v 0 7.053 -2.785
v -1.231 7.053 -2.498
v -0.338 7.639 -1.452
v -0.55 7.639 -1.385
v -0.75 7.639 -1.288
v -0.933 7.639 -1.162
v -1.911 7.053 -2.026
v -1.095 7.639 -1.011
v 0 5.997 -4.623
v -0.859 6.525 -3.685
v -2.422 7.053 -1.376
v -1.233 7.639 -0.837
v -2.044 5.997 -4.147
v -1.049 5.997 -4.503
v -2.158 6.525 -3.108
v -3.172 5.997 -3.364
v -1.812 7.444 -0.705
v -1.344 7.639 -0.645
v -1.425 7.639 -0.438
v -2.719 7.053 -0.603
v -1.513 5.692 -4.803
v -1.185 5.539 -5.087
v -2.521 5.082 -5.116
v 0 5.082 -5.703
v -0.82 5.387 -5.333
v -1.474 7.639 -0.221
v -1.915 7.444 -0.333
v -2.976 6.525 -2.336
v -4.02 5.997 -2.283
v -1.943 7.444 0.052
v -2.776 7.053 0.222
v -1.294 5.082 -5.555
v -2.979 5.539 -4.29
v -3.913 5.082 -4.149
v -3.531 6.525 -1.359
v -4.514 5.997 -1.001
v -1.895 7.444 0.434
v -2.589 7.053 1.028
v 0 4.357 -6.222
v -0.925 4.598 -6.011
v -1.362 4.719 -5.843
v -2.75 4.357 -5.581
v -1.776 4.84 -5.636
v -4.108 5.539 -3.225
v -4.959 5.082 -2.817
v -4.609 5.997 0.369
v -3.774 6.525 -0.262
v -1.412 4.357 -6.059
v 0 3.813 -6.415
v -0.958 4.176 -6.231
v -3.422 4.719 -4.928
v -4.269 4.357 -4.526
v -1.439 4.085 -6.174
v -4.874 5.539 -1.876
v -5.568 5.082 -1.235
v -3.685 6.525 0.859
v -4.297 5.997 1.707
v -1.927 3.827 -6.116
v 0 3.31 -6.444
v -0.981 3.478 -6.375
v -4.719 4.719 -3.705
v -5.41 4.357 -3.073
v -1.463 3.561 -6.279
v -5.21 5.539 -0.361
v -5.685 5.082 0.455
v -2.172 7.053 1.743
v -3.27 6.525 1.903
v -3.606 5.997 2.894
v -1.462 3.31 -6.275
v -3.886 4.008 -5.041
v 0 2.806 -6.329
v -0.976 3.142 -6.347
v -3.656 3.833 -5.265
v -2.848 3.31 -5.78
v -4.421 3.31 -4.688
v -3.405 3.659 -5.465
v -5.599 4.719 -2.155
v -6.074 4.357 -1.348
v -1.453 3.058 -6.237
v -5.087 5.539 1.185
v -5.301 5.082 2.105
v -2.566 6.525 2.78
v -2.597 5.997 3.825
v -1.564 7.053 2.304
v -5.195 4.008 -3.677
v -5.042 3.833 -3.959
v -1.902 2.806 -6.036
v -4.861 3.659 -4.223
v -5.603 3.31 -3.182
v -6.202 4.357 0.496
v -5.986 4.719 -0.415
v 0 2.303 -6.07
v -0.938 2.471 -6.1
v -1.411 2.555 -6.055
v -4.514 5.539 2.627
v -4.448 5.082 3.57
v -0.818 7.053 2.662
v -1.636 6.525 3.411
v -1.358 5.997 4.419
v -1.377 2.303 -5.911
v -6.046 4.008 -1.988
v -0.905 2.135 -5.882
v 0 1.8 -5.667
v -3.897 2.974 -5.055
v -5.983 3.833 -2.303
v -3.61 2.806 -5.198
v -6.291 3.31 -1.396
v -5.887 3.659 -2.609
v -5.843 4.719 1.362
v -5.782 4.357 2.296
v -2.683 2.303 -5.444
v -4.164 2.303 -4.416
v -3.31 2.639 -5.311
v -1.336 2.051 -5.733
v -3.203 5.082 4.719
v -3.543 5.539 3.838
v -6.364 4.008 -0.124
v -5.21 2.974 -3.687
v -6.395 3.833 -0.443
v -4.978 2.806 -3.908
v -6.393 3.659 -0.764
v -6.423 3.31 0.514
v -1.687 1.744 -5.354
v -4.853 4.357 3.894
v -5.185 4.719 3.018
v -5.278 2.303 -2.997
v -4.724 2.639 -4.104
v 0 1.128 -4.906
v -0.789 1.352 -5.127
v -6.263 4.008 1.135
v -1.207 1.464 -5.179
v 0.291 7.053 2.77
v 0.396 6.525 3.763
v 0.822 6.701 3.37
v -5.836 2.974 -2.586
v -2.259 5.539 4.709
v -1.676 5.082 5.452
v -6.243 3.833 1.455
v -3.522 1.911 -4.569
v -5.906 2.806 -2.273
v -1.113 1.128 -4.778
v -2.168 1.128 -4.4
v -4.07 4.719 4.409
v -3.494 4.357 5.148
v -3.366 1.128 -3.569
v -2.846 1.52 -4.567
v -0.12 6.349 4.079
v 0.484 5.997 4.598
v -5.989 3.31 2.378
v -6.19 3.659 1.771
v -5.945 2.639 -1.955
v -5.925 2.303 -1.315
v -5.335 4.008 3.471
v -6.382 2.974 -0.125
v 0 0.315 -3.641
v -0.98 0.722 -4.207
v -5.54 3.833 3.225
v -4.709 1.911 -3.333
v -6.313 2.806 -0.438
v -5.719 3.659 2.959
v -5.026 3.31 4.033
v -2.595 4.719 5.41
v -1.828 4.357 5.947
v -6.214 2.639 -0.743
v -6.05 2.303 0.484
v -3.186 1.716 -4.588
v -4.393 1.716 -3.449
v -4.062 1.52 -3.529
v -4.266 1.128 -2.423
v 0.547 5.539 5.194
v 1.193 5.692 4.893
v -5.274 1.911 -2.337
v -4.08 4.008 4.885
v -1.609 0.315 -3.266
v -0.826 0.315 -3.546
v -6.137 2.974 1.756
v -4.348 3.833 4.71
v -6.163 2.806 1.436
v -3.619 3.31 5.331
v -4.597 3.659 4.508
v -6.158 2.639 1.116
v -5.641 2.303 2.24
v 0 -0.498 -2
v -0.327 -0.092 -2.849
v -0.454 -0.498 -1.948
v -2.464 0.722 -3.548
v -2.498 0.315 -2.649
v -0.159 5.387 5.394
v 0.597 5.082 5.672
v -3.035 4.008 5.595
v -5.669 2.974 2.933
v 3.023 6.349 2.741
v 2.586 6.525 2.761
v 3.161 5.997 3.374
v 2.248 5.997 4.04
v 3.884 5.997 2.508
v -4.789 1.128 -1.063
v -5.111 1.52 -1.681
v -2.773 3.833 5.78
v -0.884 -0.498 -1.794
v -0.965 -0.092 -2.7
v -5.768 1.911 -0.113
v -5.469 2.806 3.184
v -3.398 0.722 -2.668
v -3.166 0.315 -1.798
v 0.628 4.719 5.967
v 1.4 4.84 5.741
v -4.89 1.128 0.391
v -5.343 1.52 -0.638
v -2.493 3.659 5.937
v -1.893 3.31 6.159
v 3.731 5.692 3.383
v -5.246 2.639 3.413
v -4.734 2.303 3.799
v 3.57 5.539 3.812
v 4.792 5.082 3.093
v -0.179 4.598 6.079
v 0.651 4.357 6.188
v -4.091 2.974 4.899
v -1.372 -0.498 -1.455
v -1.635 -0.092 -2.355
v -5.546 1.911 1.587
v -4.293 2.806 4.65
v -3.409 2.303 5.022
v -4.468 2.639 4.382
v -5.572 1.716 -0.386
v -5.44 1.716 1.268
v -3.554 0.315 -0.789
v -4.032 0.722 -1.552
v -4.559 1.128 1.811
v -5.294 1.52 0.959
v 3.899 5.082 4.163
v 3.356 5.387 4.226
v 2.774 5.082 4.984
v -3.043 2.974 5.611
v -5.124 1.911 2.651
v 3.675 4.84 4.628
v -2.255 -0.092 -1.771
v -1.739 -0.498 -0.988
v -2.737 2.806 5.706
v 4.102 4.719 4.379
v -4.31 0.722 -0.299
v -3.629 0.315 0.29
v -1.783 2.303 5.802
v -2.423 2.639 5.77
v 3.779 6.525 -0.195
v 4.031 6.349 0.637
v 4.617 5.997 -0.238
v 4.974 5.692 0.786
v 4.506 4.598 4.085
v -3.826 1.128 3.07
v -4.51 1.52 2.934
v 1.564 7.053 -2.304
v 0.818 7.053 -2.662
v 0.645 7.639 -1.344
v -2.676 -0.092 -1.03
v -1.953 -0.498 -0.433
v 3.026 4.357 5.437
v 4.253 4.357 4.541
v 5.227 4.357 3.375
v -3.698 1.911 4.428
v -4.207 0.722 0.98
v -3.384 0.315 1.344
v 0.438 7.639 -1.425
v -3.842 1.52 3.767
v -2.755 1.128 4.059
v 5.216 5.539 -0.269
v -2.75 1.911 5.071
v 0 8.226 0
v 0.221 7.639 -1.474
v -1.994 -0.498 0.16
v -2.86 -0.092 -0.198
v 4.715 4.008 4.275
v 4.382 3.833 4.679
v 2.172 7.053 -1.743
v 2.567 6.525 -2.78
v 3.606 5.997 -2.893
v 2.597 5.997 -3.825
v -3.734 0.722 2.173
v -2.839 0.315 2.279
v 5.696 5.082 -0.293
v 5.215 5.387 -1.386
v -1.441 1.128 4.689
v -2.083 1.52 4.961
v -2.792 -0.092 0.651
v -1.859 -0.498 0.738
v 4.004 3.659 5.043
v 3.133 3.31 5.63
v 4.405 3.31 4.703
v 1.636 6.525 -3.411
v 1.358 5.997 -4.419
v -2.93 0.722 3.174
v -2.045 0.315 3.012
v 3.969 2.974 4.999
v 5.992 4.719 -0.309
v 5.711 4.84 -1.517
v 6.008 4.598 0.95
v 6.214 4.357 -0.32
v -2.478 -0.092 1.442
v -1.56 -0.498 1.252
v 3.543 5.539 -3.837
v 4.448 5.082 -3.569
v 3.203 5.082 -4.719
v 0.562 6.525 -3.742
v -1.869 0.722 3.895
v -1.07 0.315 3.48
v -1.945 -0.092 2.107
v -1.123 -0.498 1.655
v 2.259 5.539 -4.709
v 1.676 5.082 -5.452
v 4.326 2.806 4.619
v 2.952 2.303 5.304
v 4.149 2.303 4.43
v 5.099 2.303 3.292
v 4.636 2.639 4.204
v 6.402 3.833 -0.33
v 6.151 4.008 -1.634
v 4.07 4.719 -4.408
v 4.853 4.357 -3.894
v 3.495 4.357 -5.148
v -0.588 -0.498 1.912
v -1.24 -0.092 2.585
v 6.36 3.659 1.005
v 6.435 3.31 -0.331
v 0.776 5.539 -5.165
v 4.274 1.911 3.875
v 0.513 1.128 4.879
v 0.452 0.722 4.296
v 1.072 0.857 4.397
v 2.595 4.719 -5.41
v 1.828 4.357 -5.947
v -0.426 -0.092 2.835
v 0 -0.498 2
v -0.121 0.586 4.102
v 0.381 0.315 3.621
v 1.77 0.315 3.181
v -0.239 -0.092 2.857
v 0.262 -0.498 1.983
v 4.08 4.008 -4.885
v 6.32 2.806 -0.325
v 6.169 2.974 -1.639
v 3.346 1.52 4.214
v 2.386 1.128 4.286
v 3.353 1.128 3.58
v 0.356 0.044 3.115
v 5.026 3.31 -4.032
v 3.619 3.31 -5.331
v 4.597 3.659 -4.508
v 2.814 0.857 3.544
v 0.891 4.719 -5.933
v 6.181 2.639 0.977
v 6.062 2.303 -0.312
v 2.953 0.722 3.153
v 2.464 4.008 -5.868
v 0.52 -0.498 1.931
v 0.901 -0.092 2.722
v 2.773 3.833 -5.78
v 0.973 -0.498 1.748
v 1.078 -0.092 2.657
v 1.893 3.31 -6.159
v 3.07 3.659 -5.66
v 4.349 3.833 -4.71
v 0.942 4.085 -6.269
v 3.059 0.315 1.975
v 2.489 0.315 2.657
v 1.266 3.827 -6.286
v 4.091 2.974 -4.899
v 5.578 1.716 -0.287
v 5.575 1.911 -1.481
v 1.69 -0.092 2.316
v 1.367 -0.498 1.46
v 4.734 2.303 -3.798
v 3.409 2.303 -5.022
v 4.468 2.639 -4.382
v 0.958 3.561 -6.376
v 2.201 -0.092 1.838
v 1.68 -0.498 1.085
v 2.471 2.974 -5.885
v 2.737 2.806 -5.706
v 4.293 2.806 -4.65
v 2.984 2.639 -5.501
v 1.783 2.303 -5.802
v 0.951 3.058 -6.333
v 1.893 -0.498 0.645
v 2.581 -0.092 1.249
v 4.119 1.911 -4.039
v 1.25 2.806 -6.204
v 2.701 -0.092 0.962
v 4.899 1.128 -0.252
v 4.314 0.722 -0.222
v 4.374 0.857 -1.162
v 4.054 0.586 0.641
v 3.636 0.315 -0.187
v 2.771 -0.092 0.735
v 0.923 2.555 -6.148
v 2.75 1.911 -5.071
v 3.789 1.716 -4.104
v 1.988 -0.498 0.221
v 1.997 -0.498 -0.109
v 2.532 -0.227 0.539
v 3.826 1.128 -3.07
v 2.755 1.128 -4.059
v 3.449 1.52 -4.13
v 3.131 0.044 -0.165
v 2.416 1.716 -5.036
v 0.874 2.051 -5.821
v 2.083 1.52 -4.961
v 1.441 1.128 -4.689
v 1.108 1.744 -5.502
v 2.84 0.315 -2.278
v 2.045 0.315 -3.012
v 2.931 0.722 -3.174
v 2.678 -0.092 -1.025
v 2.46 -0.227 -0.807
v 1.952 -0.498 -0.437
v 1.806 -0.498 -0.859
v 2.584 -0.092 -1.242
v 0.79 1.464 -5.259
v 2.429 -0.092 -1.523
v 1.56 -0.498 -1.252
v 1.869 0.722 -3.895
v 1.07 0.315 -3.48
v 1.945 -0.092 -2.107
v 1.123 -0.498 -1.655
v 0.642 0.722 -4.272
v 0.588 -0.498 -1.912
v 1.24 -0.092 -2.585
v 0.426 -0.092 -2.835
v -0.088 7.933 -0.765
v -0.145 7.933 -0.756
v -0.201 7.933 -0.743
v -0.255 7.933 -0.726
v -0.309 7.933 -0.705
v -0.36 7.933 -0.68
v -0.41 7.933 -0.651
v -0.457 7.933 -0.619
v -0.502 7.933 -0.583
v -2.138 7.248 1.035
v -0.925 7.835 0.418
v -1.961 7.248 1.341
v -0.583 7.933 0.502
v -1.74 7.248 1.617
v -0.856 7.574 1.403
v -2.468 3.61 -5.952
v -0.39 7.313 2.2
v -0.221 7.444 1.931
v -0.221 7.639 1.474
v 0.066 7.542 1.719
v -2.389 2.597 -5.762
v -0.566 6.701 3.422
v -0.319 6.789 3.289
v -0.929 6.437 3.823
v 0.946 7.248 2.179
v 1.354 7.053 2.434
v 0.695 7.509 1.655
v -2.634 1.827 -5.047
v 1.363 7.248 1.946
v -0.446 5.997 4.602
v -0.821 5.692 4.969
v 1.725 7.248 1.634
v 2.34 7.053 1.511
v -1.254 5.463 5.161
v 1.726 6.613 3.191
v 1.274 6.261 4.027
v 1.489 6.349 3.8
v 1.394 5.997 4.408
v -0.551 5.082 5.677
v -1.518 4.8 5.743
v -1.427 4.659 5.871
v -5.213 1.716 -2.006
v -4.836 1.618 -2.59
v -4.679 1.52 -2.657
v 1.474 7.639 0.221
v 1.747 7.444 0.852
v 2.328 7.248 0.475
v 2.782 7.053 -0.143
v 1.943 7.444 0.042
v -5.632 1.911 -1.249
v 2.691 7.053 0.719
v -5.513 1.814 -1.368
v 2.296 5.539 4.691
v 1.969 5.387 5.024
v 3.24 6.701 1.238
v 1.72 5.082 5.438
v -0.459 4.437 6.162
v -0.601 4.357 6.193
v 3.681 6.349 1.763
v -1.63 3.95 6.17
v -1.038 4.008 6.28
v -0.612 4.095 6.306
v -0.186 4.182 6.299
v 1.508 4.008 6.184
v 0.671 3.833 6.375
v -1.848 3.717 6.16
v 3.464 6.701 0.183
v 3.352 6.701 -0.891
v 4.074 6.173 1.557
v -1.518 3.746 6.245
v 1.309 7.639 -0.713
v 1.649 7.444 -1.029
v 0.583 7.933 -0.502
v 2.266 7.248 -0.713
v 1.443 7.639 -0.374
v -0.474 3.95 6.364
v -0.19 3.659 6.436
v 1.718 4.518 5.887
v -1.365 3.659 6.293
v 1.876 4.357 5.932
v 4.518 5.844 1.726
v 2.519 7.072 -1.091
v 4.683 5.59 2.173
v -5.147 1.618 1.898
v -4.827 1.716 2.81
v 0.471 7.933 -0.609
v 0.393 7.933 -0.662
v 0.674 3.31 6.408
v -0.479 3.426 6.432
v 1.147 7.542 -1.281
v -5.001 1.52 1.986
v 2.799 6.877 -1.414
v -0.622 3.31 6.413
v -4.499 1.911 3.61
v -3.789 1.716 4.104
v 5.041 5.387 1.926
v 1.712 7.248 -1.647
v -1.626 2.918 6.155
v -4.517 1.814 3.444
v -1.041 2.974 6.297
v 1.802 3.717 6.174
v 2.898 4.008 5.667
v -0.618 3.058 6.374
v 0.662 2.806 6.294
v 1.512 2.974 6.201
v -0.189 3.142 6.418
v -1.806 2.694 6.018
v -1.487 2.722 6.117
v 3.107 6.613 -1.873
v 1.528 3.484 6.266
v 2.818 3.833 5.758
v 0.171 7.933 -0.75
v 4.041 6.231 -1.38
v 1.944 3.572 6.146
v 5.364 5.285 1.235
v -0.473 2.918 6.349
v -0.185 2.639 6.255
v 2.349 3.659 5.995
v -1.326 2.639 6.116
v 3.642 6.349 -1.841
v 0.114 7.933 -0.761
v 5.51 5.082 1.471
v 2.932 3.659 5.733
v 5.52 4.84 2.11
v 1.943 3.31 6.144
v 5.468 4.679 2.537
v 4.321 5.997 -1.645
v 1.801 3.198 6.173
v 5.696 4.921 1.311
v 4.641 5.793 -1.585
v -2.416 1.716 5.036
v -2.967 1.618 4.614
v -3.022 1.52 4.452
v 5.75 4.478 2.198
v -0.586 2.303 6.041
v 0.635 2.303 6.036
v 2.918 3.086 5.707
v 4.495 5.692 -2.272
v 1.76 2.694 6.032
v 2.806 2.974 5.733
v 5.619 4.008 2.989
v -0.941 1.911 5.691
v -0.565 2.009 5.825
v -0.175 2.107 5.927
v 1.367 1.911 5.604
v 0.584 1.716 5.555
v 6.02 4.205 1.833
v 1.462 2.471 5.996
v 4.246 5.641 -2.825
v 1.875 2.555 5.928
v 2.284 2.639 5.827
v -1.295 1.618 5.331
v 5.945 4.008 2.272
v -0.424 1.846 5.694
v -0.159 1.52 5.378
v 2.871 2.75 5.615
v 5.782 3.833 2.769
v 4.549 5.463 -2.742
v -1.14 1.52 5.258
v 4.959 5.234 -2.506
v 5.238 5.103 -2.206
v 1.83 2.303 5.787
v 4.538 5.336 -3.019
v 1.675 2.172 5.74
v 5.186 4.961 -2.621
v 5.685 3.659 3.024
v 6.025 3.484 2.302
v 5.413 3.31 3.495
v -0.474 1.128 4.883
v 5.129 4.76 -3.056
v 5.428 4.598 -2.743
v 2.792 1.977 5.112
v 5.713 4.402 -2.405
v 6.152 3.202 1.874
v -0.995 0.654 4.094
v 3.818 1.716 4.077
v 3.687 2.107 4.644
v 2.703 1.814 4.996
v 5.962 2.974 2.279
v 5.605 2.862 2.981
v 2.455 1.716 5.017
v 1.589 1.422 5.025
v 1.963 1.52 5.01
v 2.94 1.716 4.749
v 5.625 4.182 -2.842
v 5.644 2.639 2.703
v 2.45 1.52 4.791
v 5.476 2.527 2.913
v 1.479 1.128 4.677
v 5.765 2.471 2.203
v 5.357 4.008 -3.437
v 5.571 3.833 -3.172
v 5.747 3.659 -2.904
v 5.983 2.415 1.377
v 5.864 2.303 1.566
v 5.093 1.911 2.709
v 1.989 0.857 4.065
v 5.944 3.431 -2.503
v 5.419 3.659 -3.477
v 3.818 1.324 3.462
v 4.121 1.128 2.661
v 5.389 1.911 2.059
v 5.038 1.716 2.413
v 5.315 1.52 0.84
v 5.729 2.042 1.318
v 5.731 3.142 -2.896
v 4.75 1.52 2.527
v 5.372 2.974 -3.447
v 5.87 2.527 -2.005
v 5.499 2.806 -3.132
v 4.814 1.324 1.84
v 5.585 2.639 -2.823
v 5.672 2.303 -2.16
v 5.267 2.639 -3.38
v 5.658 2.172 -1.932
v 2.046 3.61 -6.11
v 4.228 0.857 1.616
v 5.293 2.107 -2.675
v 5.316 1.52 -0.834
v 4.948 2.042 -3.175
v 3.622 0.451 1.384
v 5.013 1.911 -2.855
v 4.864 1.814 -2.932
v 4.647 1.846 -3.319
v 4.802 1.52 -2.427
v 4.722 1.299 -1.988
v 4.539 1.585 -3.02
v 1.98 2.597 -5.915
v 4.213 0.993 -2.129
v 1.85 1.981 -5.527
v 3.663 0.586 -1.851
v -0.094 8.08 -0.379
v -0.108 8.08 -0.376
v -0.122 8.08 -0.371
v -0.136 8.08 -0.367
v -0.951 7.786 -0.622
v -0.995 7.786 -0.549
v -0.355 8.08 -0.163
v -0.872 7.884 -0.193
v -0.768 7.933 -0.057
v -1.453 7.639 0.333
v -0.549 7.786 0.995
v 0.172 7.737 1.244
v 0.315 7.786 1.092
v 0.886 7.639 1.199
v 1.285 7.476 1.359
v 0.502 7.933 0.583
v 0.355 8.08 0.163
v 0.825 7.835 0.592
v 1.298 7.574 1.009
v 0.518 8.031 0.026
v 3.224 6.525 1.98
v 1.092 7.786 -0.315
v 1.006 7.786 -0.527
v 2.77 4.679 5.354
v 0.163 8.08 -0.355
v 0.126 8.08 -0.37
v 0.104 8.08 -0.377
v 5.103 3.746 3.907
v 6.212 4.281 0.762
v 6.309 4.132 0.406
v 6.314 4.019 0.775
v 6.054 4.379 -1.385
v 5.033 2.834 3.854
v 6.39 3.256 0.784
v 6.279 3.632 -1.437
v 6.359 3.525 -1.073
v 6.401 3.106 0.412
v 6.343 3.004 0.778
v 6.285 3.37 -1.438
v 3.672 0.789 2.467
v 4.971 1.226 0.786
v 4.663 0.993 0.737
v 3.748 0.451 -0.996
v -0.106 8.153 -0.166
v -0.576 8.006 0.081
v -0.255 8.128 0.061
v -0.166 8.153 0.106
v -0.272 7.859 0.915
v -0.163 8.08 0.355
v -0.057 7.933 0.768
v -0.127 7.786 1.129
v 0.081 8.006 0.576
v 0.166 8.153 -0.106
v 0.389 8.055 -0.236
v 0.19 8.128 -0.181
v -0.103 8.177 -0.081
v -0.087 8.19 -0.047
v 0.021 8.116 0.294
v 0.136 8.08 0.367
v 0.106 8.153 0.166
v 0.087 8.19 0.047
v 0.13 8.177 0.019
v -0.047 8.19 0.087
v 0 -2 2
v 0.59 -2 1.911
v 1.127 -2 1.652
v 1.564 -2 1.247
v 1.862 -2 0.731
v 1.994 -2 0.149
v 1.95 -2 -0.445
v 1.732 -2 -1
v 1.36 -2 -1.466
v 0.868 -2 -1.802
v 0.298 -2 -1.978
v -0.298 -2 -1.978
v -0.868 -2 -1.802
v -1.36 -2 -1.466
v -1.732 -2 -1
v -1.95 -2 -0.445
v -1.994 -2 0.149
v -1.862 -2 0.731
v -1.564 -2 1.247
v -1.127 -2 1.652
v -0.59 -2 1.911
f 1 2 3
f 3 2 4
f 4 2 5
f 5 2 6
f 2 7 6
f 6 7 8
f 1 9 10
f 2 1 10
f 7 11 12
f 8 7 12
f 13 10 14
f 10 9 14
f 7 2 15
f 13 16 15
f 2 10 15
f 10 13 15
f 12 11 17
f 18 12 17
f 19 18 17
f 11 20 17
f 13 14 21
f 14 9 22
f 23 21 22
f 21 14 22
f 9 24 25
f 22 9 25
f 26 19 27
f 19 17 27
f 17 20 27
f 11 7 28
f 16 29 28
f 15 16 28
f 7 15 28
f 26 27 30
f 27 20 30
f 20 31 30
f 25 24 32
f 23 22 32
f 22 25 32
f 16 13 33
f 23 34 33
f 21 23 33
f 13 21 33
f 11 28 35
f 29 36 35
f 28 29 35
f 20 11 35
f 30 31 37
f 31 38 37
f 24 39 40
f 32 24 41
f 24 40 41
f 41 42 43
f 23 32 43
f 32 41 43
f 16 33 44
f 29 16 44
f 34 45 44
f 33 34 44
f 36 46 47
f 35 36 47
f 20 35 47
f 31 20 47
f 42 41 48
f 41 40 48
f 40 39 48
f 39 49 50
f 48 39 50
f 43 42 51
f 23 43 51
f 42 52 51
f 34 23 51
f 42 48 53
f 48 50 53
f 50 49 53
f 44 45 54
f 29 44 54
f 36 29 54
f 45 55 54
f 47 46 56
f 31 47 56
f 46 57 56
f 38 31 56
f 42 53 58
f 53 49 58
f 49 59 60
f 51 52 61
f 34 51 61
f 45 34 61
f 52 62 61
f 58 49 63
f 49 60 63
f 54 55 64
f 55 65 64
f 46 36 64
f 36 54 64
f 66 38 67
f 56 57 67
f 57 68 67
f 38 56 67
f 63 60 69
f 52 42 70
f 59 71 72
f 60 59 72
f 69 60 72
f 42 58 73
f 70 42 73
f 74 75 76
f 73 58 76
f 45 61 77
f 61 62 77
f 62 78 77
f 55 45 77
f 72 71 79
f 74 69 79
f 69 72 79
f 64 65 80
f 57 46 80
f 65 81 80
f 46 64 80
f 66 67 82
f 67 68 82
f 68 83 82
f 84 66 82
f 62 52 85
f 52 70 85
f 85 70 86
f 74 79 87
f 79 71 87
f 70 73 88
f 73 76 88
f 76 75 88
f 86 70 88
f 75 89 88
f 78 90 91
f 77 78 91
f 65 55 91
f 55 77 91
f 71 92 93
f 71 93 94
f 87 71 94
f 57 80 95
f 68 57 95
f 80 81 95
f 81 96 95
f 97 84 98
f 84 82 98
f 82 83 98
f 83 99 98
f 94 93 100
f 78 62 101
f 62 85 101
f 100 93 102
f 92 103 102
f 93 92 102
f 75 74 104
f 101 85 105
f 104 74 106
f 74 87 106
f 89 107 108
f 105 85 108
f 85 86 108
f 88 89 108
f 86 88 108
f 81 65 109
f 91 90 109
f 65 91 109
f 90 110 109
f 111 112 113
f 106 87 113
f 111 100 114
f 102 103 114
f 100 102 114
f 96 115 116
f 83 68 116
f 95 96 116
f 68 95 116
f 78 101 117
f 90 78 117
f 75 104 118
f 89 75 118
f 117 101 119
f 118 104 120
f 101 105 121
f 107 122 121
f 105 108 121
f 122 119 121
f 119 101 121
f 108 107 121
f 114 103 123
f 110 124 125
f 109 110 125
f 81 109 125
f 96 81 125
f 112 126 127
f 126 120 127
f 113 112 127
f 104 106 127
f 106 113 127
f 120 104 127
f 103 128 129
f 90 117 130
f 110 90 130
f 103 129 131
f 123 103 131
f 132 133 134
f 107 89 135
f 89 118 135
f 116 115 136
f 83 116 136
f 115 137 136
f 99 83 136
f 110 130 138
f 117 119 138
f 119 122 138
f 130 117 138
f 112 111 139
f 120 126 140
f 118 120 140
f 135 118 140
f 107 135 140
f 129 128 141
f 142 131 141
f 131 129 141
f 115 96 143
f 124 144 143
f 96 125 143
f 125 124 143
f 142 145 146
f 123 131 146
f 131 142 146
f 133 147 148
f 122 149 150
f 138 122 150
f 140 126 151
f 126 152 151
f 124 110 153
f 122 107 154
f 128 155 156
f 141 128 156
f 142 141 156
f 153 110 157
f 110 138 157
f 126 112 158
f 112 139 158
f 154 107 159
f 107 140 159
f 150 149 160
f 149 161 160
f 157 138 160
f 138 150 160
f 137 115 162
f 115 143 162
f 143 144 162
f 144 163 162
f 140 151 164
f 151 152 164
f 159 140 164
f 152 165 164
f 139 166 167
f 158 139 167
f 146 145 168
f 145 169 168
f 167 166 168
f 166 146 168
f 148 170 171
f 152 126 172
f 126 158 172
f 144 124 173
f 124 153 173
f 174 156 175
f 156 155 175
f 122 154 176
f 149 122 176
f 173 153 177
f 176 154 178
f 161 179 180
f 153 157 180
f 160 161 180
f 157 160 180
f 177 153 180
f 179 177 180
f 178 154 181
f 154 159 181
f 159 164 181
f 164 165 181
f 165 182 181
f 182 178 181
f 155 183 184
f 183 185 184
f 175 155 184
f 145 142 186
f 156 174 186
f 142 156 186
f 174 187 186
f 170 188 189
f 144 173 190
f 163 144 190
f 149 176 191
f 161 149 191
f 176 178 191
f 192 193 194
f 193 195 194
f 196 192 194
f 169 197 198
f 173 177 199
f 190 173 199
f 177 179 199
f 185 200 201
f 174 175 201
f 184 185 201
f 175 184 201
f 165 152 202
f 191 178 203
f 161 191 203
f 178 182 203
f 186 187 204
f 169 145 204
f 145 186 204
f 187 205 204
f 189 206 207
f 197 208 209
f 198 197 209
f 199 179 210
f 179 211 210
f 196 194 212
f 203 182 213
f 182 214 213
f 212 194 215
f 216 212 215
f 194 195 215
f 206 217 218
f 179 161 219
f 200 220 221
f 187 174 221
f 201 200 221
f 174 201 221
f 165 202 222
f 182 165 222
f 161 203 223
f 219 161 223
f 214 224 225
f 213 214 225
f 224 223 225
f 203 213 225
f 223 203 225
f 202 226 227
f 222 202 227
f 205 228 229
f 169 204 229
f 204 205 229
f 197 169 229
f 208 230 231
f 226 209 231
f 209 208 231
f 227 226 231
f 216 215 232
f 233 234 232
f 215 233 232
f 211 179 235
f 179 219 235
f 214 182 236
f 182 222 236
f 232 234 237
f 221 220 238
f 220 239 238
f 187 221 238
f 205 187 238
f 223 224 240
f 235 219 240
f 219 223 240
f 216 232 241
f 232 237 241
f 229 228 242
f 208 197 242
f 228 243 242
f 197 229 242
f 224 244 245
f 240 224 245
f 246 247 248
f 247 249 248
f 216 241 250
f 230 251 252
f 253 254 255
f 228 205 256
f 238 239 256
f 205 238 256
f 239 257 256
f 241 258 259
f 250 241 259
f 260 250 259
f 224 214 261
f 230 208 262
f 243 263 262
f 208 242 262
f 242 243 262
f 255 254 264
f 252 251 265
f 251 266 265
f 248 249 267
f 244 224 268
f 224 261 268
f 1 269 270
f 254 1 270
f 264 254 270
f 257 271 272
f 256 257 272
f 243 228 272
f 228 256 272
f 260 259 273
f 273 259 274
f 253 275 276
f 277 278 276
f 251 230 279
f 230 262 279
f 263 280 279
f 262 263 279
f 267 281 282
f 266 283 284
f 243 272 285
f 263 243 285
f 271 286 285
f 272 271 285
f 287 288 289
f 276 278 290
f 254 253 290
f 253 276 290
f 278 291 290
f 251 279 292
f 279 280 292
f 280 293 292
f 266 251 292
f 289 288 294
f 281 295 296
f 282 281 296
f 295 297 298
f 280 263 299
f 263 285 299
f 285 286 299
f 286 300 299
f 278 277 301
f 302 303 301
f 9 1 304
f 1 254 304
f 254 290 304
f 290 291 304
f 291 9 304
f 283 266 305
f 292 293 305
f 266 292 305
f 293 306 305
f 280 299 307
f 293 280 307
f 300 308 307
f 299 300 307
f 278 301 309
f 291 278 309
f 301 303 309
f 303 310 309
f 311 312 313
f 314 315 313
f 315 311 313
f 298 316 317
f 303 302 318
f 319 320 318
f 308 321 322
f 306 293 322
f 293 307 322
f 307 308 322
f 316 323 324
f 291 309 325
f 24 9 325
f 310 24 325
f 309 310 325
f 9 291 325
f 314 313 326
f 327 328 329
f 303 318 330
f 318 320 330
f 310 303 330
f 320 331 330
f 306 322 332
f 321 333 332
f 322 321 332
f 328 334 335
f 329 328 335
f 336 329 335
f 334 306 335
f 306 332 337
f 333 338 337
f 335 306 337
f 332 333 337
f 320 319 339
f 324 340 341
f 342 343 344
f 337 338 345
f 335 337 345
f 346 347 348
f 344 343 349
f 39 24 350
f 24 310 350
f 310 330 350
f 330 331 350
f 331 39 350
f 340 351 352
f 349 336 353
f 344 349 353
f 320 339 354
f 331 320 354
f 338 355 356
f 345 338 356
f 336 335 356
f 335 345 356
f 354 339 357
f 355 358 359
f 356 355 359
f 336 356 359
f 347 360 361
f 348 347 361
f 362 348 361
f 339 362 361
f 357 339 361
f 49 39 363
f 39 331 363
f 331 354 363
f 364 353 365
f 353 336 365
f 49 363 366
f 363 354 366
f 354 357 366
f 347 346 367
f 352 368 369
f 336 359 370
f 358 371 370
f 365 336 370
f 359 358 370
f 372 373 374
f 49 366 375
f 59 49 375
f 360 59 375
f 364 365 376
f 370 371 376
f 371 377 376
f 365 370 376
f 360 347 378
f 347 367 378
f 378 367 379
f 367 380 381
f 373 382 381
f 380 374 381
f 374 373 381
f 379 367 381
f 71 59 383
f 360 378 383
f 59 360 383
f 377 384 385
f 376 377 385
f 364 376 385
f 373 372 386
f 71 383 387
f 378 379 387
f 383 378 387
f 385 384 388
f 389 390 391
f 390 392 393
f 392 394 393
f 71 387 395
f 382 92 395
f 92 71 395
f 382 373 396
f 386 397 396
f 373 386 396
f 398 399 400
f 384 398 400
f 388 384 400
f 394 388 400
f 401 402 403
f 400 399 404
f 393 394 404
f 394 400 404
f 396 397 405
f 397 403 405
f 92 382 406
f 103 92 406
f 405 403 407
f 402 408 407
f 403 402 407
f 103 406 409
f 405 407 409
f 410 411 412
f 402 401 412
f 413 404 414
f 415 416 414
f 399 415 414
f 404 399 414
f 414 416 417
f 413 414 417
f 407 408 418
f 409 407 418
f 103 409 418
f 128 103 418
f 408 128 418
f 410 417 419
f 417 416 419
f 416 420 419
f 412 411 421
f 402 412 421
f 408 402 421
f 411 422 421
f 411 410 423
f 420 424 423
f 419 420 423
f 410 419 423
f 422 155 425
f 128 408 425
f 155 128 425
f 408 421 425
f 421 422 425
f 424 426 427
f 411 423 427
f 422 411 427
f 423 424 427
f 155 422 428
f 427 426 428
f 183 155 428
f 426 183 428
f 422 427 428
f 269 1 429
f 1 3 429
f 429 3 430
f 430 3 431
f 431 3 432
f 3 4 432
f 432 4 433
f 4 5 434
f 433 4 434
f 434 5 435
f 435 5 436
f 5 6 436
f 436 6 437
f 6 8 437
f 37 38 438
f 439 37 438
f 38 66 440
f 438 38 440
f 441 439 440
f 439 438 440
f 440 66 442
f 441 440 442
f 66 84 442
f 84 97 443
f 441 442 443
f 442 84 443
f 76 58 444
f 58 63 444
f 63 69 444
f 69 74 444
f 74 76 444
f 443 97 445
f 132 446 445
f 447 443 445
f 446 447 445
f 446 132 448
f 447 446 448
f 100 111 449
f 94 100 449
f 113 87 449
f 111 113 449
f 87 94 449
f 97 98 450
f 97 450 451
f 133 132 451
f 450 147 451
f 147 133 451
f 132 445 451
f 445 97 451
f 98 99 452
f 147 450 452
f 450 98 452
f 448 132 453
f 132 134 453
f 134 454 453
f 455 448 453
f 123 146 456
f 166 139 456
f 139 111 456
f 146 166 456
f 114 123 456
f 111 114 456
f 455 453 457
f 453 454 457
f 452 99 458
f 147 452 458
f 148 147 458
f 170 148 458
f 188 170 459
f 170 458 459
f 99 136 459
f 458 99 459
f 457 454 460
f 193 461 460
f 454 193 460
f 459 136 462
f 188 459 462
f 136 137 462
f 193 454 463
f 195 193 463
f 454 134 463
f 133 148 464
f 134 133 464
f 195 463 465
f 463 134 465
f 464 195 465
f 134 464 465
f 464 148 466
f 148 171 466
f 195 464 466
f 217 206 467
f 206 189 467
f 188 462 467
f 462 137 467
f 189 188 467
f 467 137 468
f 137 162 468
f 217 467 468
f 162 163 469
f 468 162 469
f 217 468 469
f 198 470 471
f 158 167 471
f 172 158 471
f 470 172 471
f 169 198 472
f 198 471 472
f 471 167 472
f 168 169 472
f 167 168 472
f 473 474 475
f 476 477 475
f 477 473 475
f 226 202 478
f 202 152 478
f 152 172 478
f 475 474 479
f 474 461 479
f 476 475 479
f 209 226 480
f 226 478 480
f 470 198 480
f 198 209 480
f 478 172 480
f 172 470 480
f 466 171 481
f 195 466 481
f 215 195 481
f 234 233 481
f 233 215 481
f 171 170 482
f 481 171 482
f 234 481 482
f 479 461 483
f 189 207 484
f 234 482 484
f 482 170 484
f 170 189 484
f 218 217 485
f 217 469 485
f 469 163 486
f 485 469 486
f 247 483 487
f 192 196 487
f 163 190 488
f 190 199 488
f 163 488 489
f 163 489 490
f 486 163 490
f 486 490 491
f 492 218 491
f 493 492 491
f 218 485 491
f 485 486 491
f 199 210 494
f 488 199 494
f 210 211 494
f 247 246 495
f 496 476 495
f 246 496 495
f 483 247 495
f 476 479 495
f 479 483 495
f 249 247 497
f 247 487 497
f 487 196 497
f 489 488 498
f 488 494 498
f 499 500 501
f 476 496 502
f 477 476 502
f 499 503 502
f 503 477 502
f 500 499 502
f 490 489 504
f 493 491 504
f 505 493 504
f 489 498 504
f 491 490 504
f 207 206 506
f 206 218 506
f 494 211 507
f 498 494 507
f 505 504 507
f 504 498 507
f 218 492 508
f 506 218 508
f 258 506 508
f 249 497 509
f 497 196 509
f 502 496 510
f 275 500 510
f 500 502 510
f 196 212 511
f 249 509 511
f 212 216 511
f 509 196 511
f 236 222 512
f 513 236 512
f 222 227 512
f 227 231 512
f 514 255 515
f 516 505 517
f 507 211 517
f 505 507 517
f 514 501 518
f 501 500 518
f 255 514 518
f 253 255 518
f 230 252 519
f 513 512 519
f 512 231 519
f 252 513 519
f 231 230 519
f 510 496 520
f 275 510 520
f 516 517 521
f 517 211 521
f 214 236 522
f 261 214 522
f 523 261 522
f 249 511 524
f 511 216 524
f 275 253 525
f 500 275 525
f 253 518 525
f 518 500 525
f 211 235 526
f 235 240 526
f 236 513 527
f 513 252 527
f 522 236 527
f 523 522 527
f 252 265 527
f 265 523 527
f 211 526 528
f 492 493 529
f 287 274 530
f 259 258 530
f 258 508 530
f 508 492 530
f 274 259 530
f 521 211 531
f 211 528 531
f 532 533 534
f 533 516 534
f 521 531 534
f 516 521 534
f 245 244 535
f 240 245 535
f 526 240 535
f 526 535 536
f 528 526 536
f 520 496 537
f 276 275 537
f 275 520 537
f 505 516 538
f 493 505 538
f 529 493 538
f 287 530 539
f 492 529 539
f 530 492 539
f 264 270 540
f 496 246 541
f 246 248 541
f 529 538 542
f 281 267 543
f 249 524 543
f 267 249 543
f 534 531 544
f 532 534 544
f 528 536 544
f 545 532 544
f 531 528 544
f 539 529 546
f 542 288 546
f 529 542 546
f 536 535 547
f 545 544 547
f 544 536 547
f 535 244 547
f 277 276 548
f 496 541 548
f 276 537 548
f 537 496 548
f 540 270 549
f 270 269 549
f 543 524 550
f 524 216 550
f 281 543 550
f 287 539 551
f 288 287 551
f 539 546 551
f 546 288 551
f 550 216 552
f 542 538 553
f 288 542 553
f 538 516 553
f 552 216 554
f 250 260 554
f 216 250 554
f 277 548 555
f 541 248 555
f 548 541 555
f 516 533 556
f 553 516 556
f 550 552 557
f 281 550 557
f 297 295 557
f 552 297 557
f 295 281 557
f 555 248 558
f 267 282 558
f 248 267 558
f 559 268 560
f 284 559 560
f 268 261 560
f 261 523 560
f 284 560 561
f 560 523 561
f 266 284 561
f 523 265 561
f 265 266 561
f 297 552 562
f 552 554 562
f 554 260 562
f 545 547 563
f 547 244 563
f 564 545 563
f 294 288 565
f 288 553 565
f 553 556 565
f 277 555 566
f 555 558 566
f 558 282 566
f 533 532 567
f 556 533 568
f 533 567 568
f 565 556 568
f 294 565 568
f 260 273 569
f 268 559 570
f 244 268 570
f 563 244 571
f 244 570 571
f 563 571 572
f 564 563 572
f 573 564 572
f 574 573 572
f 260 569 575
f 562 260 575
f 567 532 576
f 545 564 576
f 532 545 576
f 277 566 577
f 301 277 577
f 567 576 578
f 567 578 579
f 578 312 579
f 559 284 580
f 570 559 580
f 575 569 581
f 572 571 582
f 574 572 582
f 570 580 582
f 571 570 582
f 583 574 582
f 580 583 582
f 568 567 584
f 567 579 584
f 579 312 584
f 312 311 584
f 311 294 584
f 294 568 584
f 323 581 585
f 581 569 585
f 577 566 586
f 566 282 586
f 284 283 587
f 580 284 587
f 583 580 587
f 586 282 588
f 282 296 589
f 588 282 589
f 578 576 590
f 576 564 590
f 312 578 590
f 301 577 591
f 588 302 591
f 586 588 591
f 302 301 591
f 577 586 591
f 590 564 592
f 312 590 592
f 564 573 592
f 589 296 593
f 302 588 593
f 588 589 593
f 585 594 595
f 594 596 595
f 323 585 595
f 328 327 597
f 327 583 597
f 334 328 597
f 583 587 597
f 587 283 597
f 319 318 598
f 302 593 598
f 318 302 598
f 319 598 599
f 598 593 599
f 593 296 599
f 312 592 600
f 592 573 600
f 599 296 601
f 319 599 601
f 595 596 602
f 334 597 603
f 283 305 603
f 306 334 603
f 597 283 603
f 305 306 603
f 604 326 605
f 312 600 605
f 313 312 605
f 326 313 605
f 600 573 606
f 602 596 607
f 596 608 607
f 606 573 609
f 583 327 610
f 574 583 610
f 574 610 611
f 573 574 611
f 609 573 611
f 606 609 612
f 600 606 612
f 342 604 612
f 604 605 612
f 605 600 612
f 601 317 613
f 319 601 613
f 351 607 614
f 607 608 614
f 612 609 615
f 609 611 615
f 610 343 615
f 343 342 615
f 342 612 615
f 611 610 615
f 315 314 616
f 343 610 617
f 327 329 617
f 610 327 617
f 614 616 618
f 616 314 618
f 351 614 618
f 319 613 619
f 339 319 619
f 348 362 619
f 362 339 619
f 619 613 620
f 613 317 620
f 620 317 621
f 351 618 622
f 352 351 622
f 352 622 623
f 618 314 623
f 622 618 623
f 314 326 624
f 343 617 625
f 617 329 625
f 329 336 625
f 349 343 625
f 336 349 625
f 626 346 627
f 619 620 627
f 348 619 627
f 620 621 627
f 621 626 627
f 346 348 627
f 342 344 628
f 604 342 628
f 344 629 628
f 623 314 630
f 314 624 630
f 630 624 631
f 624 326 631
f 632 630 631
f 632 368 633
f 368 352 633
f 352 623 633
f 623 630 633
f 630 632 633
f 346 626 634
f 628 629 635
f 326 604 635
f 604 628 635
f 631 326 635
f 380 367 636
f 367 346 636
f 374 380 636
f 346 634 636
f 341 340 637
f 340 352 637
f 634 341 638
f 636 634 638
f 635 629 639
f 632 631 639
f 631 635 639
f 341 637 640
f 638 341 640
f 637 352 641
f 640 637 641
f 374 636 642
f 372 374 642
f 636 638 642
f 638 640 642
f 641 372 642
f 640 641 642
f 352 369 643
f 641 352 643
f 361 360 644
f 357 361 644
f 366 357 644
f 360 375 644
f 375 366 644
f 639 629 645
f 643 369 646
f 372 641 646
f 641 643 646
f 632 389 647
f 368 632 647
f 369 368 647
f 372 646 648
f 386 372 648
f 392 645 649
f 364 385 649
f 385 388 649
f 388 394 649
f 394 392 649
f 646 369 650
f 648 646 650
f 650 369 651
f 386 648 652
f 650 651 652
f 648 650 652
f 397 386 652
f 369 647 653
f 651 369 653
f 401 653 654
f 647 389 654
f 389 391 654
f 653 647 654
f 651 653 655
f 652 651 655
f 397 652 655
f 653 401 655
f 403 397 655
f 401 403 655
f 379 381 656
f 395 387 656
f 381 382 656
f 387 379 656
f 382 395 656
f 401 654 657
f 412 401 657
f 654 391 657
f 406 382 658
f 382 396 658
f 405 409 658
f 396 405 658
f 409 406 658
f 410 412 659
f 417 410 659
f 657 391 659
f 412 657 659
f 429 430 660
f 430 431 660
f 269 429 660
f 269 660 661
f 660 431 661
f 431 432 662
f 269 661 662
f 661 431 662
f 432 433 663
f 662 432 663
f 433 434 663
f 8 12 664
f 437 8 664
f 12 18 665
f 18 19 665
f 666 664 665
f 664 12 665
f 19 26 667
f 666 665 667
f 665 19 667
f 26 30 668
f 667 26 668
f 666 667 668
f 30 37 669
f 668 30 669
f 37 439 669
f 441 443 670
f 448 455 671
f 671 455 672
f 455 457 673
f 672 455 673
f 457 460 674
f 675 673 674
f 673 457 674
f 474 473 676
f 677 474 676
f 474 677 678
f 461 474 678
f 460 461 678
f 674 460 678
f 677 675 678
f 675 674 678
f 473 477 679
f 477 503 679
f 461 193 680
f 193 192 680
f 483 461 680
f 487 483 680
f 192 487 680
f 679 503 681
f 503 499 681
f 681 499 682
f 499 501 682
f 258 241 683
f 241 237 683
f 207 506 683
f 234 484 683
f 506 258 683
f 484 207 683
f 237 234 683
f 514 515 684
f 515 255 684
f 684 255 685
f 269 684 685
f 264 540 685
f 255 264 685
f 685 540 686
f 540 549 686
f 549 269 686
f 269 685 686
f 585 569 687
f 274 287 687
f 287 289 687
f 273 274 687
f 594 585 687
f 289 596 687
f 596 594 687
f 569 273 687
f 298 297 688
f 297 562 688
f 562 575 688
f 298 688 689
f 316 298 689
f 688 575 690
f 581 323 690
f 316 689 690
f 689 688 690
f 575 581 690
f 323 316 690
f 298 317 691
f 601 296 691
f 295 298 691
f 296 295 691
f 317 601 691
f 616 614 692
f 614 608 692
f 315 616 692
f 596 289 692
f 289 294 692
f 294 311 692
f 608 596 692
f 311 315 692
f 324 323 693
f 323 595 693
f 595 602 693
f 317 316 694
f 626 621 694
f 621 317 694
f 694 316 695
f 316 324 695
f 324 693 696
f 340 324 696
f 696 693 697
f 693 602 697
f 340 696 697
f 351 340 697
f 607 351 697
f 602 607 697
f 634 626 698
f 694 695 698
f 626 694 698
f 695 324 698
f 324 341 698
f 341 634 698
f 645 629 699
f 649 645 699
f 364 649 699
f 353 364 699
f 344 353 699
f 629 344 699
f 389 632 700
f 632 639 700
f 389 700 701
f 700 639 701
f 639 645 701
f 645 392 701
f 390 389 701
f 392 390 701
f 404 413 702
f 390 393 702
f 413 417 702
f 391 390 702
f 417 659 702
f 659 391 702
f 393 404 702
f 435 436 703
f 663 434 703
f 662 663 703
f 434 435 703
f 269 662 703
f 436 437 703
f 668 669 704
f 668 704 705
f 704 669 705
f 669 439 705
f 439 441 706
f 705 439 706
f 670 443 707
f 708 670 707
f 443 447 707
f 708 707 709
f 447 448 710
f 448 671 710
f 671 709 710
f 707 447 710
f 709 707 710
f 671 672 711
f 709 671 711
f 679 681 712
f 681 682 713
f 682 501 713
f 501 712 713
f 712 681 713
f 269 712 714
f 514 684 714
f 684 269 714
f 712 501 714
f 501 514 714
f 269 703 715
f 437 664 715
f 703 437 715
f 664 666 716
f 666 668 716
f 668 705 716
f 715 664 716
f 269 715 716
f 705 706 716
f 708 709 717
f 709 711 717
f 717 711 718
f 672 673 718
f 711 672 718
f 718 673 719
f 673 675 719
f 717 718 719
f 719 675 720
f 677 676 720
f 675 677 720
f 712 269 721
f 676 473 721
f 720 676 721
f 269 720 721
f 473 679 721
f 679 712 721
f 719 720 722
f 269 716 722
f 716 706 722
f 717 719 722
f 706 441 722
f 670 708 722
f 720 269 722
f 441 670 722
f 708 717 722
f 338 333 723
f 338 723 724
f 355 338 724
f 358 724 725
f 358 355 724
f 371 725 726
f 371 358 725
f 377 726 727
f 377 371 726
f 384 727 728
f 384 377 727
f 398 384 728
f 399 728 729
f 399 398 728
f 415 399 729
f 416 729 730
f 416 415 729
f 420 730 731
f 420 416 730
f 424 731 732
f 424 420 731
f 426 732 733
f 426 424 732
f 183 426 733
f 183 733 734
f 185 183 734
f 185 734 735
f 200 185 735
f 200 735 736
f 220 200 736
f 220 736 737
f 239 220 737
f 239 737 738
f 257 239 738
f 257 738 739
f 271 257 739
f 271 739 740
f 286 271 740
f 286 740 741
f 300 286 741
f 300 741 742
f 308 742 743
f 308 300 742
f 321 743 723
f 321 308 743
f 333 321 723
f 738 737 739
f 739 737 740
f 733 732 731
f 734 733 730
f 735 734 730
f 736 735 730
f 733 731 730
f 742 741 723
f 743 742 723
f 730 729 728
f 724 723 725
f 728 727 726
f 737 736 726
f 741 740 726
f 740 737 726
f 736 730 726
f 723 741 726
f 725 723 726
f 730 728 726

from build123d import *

# Parameters (mm, degrees)
SKETCH9_R           = 2
BOSS_EXTRUDE1_DEPTH = 2


with BuildPart() as part:
    # Sketch5 → Revolve2 (revolve)
    with BuildSketch(Plane(origin=(0, 0, 0), x_dir=(0, 0, -1), z_dir=(1, 0, 0))):
        with BuildLine():
            Line((0, -1.305492492), (0, 8.226206899))
            add(Edge.make_bspline(
                [(0, 8.226206899), (12.899965566, 3.460357203), (0, -1.305492492)],
                knots=[0, 0, 0, 1, 1, 1], degree=2))
        make_face()
    revolve(axis=Axis((0, -1.305492492, 0), (0, 1, 0)))

    # Sketch9 → Boss-Extrude1 (add)
    with BuildSketch(Plane(origin=(0, 0, 0), x_dir=(1, 0, 0), z_dir=(0, 1, 0))):
        with Locations(Location((0, 0, 0), (0, 0, 270))):
            Circle(SKETCH9_R)
    extrude(amount=-BOSS_EXTRUDE1_DEPTH)


solid = part.part
